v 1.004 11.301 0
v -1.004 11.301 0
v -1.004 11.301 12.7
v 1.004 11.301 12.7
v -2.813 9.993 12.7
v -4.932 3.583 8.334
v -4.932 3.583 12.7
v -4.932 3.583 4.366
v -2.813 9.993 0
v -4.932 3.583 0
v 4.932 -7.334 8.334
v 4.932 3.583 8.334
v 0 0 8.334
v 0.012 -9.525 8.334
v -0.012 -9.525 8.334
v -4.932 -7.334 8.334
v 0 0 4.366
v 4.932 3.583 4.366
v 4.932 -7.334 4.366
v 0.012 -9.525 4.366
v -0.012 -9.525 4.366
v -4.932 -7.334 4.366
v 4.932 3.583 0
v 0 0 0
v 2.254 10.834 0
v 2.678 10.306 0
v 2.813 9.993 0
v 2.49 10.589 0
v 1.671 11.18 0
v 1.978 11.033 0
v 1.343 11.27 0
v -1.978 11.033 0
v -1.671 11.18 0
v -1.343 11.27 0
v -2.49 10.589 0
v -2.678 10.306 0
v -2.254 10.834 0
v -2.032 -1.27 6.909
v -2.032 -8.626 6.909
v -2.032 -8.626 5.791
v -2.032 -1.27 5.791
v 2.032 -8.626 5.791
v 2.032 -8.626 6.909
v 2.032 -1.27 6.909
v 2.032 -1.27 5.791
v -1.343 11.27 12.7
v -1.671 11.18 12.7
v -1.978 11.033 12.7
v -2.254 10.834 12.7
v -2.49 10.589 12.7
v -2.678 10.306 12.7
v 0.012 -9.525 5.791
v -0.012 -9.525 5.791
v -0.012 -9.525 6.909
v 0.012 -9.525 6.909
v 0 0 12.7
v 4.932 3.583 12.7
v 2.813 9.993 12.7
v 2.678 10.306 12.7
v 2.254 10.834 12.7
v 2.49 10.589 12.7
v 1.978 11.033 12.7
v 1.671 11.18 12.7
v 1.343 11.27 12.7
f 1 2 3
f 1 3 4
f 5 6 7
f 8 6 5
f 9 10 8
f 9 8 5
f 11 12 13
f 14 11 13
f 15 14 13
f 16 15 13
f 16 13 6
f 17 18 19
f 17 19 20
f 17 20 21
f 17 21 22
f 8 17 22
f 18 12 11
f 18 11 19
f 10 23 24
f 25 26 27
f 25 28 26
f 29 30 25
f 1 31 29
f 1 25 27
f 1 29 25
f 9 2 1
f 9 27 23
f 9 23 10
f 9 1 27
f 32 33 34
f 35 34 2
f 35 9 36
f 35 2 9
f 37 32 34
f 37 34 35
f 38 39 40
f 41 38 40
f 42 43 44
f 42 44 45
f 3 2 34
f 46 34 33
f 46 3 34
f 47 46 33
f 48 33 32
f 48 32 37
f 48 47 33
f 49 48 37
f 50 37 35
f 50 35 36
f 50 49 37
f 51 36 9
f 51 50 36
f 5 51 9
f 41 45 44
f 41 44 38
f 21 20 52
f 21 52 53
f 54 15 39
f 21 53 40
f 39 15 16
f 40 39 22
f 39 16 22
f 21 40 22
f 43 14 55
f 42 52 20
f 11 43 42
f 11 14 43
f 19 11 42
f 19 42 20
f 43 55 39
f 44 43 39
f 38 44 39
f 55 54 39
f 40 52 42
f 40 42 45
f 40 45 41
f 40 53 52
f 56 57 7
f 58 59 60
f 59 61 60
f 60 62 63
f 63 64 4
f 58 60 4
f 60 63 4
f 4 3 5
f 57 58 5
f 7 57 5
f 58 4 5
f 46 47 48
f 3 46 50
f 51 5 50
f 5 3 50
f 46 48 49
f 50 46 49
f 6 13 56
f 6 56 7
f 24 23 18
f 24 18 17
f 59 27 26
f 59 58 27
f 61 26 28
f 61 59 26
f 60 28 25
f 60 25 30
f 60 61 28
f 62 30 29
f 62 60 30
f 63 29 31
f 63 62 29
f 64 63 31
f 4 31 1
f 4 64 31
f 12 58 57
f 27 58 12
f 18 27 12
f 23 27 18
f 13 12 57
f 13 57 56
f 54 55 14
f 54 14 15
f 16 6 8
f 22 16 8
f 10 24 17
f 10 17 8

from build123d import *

# Parameters (mm, degrees)
BOSS_EXTRUDE1_DEPTH = 12.7
BOSS_EXTRUDE2_START = -3.583139
SKETCH3_W           = 9.863535196
SKETCH3_H           = 3.96875
BOSS_EXTRUDE2_DEPTH = 13.108139
FILLET1_R           = 1.905
CHAMFER1_SIZE       = 4.92
CHAMFER1_SIZE2      = 2.190525132
SKETCH5_W           = 4.064
SKETCH5_H           = 1.1176
CUT_EXTRUDE2_DEPTH  = 8.255


with BuildPart() as part:
    # Sketch1 → Boss-Extrude1 (new body)
    with BuildSketch(Plane.XY):
        Polygon((0, 0), (-4.931767598, 3.583138898), (-2.38125, 11.30060247), (2.38125, 11.30060247), (4.931767598, 3.583138898), align=None)
    extrude(amount=BOSS_EXTRUDE1_DEPTH)

    # Sketch3 → Boss-Extrude2 (add)
    with BuildSketch(Plane(origin=(0, 0, 0), x_dir=(-1, 0, 0), z_dir=(0, -1, 0)).offset(BOSS_EXTRUDE2_START)):
        with Locations((0, -6.35)):
            Rectangle(SKETCH3_W, SKETCH3_H)
    extrude(amount=BOSS_EXTRUDE2_DEPTH)

    # Fillet1
    fillet1_edges = [part.edges().sort_by_distance(p)[0] for p in [
        (-2.38125, 11.30060247, 6.35),
        (2.38125, 11.30060247, 6.35),
    ]]
    fillet(fillet1_edges, radius=FILLET1_R)

    # Chamfer1
    chamfer1_edges = [part.edges().sort_by_distance(p)[0] for p in [
        (4.931767598, -9.525, 6.35),
        (-4.931767598, -9.525, 6.35),
    ]]
    chamfer1_side = [part.faces().sort_by_distance(p)[0] for p in [
        (0, -9.525, 6.35),
    ]]
    chamfer(chamfer1_edges, length=CHAMFER1_SIZE, length2=CHAMFER1_SIZE2, reference=chamfer1_side[0])

    # Sketch5 → Cut-Extrude2 (cut)
    with BuildSketch(Plane(origin=(0, -9.525, 0), x_dir=(-1, 0, 0), z_dir=(0, -1, 0))):
        with Locations((0, -6.35)):
            Rectangle(SKETCH5_W, SKETCH5_H)
    extrude(amount=-CUT_EXTRUDE2_DEPTH, mode=Mode.SUBTRACT)


solid = part.part
